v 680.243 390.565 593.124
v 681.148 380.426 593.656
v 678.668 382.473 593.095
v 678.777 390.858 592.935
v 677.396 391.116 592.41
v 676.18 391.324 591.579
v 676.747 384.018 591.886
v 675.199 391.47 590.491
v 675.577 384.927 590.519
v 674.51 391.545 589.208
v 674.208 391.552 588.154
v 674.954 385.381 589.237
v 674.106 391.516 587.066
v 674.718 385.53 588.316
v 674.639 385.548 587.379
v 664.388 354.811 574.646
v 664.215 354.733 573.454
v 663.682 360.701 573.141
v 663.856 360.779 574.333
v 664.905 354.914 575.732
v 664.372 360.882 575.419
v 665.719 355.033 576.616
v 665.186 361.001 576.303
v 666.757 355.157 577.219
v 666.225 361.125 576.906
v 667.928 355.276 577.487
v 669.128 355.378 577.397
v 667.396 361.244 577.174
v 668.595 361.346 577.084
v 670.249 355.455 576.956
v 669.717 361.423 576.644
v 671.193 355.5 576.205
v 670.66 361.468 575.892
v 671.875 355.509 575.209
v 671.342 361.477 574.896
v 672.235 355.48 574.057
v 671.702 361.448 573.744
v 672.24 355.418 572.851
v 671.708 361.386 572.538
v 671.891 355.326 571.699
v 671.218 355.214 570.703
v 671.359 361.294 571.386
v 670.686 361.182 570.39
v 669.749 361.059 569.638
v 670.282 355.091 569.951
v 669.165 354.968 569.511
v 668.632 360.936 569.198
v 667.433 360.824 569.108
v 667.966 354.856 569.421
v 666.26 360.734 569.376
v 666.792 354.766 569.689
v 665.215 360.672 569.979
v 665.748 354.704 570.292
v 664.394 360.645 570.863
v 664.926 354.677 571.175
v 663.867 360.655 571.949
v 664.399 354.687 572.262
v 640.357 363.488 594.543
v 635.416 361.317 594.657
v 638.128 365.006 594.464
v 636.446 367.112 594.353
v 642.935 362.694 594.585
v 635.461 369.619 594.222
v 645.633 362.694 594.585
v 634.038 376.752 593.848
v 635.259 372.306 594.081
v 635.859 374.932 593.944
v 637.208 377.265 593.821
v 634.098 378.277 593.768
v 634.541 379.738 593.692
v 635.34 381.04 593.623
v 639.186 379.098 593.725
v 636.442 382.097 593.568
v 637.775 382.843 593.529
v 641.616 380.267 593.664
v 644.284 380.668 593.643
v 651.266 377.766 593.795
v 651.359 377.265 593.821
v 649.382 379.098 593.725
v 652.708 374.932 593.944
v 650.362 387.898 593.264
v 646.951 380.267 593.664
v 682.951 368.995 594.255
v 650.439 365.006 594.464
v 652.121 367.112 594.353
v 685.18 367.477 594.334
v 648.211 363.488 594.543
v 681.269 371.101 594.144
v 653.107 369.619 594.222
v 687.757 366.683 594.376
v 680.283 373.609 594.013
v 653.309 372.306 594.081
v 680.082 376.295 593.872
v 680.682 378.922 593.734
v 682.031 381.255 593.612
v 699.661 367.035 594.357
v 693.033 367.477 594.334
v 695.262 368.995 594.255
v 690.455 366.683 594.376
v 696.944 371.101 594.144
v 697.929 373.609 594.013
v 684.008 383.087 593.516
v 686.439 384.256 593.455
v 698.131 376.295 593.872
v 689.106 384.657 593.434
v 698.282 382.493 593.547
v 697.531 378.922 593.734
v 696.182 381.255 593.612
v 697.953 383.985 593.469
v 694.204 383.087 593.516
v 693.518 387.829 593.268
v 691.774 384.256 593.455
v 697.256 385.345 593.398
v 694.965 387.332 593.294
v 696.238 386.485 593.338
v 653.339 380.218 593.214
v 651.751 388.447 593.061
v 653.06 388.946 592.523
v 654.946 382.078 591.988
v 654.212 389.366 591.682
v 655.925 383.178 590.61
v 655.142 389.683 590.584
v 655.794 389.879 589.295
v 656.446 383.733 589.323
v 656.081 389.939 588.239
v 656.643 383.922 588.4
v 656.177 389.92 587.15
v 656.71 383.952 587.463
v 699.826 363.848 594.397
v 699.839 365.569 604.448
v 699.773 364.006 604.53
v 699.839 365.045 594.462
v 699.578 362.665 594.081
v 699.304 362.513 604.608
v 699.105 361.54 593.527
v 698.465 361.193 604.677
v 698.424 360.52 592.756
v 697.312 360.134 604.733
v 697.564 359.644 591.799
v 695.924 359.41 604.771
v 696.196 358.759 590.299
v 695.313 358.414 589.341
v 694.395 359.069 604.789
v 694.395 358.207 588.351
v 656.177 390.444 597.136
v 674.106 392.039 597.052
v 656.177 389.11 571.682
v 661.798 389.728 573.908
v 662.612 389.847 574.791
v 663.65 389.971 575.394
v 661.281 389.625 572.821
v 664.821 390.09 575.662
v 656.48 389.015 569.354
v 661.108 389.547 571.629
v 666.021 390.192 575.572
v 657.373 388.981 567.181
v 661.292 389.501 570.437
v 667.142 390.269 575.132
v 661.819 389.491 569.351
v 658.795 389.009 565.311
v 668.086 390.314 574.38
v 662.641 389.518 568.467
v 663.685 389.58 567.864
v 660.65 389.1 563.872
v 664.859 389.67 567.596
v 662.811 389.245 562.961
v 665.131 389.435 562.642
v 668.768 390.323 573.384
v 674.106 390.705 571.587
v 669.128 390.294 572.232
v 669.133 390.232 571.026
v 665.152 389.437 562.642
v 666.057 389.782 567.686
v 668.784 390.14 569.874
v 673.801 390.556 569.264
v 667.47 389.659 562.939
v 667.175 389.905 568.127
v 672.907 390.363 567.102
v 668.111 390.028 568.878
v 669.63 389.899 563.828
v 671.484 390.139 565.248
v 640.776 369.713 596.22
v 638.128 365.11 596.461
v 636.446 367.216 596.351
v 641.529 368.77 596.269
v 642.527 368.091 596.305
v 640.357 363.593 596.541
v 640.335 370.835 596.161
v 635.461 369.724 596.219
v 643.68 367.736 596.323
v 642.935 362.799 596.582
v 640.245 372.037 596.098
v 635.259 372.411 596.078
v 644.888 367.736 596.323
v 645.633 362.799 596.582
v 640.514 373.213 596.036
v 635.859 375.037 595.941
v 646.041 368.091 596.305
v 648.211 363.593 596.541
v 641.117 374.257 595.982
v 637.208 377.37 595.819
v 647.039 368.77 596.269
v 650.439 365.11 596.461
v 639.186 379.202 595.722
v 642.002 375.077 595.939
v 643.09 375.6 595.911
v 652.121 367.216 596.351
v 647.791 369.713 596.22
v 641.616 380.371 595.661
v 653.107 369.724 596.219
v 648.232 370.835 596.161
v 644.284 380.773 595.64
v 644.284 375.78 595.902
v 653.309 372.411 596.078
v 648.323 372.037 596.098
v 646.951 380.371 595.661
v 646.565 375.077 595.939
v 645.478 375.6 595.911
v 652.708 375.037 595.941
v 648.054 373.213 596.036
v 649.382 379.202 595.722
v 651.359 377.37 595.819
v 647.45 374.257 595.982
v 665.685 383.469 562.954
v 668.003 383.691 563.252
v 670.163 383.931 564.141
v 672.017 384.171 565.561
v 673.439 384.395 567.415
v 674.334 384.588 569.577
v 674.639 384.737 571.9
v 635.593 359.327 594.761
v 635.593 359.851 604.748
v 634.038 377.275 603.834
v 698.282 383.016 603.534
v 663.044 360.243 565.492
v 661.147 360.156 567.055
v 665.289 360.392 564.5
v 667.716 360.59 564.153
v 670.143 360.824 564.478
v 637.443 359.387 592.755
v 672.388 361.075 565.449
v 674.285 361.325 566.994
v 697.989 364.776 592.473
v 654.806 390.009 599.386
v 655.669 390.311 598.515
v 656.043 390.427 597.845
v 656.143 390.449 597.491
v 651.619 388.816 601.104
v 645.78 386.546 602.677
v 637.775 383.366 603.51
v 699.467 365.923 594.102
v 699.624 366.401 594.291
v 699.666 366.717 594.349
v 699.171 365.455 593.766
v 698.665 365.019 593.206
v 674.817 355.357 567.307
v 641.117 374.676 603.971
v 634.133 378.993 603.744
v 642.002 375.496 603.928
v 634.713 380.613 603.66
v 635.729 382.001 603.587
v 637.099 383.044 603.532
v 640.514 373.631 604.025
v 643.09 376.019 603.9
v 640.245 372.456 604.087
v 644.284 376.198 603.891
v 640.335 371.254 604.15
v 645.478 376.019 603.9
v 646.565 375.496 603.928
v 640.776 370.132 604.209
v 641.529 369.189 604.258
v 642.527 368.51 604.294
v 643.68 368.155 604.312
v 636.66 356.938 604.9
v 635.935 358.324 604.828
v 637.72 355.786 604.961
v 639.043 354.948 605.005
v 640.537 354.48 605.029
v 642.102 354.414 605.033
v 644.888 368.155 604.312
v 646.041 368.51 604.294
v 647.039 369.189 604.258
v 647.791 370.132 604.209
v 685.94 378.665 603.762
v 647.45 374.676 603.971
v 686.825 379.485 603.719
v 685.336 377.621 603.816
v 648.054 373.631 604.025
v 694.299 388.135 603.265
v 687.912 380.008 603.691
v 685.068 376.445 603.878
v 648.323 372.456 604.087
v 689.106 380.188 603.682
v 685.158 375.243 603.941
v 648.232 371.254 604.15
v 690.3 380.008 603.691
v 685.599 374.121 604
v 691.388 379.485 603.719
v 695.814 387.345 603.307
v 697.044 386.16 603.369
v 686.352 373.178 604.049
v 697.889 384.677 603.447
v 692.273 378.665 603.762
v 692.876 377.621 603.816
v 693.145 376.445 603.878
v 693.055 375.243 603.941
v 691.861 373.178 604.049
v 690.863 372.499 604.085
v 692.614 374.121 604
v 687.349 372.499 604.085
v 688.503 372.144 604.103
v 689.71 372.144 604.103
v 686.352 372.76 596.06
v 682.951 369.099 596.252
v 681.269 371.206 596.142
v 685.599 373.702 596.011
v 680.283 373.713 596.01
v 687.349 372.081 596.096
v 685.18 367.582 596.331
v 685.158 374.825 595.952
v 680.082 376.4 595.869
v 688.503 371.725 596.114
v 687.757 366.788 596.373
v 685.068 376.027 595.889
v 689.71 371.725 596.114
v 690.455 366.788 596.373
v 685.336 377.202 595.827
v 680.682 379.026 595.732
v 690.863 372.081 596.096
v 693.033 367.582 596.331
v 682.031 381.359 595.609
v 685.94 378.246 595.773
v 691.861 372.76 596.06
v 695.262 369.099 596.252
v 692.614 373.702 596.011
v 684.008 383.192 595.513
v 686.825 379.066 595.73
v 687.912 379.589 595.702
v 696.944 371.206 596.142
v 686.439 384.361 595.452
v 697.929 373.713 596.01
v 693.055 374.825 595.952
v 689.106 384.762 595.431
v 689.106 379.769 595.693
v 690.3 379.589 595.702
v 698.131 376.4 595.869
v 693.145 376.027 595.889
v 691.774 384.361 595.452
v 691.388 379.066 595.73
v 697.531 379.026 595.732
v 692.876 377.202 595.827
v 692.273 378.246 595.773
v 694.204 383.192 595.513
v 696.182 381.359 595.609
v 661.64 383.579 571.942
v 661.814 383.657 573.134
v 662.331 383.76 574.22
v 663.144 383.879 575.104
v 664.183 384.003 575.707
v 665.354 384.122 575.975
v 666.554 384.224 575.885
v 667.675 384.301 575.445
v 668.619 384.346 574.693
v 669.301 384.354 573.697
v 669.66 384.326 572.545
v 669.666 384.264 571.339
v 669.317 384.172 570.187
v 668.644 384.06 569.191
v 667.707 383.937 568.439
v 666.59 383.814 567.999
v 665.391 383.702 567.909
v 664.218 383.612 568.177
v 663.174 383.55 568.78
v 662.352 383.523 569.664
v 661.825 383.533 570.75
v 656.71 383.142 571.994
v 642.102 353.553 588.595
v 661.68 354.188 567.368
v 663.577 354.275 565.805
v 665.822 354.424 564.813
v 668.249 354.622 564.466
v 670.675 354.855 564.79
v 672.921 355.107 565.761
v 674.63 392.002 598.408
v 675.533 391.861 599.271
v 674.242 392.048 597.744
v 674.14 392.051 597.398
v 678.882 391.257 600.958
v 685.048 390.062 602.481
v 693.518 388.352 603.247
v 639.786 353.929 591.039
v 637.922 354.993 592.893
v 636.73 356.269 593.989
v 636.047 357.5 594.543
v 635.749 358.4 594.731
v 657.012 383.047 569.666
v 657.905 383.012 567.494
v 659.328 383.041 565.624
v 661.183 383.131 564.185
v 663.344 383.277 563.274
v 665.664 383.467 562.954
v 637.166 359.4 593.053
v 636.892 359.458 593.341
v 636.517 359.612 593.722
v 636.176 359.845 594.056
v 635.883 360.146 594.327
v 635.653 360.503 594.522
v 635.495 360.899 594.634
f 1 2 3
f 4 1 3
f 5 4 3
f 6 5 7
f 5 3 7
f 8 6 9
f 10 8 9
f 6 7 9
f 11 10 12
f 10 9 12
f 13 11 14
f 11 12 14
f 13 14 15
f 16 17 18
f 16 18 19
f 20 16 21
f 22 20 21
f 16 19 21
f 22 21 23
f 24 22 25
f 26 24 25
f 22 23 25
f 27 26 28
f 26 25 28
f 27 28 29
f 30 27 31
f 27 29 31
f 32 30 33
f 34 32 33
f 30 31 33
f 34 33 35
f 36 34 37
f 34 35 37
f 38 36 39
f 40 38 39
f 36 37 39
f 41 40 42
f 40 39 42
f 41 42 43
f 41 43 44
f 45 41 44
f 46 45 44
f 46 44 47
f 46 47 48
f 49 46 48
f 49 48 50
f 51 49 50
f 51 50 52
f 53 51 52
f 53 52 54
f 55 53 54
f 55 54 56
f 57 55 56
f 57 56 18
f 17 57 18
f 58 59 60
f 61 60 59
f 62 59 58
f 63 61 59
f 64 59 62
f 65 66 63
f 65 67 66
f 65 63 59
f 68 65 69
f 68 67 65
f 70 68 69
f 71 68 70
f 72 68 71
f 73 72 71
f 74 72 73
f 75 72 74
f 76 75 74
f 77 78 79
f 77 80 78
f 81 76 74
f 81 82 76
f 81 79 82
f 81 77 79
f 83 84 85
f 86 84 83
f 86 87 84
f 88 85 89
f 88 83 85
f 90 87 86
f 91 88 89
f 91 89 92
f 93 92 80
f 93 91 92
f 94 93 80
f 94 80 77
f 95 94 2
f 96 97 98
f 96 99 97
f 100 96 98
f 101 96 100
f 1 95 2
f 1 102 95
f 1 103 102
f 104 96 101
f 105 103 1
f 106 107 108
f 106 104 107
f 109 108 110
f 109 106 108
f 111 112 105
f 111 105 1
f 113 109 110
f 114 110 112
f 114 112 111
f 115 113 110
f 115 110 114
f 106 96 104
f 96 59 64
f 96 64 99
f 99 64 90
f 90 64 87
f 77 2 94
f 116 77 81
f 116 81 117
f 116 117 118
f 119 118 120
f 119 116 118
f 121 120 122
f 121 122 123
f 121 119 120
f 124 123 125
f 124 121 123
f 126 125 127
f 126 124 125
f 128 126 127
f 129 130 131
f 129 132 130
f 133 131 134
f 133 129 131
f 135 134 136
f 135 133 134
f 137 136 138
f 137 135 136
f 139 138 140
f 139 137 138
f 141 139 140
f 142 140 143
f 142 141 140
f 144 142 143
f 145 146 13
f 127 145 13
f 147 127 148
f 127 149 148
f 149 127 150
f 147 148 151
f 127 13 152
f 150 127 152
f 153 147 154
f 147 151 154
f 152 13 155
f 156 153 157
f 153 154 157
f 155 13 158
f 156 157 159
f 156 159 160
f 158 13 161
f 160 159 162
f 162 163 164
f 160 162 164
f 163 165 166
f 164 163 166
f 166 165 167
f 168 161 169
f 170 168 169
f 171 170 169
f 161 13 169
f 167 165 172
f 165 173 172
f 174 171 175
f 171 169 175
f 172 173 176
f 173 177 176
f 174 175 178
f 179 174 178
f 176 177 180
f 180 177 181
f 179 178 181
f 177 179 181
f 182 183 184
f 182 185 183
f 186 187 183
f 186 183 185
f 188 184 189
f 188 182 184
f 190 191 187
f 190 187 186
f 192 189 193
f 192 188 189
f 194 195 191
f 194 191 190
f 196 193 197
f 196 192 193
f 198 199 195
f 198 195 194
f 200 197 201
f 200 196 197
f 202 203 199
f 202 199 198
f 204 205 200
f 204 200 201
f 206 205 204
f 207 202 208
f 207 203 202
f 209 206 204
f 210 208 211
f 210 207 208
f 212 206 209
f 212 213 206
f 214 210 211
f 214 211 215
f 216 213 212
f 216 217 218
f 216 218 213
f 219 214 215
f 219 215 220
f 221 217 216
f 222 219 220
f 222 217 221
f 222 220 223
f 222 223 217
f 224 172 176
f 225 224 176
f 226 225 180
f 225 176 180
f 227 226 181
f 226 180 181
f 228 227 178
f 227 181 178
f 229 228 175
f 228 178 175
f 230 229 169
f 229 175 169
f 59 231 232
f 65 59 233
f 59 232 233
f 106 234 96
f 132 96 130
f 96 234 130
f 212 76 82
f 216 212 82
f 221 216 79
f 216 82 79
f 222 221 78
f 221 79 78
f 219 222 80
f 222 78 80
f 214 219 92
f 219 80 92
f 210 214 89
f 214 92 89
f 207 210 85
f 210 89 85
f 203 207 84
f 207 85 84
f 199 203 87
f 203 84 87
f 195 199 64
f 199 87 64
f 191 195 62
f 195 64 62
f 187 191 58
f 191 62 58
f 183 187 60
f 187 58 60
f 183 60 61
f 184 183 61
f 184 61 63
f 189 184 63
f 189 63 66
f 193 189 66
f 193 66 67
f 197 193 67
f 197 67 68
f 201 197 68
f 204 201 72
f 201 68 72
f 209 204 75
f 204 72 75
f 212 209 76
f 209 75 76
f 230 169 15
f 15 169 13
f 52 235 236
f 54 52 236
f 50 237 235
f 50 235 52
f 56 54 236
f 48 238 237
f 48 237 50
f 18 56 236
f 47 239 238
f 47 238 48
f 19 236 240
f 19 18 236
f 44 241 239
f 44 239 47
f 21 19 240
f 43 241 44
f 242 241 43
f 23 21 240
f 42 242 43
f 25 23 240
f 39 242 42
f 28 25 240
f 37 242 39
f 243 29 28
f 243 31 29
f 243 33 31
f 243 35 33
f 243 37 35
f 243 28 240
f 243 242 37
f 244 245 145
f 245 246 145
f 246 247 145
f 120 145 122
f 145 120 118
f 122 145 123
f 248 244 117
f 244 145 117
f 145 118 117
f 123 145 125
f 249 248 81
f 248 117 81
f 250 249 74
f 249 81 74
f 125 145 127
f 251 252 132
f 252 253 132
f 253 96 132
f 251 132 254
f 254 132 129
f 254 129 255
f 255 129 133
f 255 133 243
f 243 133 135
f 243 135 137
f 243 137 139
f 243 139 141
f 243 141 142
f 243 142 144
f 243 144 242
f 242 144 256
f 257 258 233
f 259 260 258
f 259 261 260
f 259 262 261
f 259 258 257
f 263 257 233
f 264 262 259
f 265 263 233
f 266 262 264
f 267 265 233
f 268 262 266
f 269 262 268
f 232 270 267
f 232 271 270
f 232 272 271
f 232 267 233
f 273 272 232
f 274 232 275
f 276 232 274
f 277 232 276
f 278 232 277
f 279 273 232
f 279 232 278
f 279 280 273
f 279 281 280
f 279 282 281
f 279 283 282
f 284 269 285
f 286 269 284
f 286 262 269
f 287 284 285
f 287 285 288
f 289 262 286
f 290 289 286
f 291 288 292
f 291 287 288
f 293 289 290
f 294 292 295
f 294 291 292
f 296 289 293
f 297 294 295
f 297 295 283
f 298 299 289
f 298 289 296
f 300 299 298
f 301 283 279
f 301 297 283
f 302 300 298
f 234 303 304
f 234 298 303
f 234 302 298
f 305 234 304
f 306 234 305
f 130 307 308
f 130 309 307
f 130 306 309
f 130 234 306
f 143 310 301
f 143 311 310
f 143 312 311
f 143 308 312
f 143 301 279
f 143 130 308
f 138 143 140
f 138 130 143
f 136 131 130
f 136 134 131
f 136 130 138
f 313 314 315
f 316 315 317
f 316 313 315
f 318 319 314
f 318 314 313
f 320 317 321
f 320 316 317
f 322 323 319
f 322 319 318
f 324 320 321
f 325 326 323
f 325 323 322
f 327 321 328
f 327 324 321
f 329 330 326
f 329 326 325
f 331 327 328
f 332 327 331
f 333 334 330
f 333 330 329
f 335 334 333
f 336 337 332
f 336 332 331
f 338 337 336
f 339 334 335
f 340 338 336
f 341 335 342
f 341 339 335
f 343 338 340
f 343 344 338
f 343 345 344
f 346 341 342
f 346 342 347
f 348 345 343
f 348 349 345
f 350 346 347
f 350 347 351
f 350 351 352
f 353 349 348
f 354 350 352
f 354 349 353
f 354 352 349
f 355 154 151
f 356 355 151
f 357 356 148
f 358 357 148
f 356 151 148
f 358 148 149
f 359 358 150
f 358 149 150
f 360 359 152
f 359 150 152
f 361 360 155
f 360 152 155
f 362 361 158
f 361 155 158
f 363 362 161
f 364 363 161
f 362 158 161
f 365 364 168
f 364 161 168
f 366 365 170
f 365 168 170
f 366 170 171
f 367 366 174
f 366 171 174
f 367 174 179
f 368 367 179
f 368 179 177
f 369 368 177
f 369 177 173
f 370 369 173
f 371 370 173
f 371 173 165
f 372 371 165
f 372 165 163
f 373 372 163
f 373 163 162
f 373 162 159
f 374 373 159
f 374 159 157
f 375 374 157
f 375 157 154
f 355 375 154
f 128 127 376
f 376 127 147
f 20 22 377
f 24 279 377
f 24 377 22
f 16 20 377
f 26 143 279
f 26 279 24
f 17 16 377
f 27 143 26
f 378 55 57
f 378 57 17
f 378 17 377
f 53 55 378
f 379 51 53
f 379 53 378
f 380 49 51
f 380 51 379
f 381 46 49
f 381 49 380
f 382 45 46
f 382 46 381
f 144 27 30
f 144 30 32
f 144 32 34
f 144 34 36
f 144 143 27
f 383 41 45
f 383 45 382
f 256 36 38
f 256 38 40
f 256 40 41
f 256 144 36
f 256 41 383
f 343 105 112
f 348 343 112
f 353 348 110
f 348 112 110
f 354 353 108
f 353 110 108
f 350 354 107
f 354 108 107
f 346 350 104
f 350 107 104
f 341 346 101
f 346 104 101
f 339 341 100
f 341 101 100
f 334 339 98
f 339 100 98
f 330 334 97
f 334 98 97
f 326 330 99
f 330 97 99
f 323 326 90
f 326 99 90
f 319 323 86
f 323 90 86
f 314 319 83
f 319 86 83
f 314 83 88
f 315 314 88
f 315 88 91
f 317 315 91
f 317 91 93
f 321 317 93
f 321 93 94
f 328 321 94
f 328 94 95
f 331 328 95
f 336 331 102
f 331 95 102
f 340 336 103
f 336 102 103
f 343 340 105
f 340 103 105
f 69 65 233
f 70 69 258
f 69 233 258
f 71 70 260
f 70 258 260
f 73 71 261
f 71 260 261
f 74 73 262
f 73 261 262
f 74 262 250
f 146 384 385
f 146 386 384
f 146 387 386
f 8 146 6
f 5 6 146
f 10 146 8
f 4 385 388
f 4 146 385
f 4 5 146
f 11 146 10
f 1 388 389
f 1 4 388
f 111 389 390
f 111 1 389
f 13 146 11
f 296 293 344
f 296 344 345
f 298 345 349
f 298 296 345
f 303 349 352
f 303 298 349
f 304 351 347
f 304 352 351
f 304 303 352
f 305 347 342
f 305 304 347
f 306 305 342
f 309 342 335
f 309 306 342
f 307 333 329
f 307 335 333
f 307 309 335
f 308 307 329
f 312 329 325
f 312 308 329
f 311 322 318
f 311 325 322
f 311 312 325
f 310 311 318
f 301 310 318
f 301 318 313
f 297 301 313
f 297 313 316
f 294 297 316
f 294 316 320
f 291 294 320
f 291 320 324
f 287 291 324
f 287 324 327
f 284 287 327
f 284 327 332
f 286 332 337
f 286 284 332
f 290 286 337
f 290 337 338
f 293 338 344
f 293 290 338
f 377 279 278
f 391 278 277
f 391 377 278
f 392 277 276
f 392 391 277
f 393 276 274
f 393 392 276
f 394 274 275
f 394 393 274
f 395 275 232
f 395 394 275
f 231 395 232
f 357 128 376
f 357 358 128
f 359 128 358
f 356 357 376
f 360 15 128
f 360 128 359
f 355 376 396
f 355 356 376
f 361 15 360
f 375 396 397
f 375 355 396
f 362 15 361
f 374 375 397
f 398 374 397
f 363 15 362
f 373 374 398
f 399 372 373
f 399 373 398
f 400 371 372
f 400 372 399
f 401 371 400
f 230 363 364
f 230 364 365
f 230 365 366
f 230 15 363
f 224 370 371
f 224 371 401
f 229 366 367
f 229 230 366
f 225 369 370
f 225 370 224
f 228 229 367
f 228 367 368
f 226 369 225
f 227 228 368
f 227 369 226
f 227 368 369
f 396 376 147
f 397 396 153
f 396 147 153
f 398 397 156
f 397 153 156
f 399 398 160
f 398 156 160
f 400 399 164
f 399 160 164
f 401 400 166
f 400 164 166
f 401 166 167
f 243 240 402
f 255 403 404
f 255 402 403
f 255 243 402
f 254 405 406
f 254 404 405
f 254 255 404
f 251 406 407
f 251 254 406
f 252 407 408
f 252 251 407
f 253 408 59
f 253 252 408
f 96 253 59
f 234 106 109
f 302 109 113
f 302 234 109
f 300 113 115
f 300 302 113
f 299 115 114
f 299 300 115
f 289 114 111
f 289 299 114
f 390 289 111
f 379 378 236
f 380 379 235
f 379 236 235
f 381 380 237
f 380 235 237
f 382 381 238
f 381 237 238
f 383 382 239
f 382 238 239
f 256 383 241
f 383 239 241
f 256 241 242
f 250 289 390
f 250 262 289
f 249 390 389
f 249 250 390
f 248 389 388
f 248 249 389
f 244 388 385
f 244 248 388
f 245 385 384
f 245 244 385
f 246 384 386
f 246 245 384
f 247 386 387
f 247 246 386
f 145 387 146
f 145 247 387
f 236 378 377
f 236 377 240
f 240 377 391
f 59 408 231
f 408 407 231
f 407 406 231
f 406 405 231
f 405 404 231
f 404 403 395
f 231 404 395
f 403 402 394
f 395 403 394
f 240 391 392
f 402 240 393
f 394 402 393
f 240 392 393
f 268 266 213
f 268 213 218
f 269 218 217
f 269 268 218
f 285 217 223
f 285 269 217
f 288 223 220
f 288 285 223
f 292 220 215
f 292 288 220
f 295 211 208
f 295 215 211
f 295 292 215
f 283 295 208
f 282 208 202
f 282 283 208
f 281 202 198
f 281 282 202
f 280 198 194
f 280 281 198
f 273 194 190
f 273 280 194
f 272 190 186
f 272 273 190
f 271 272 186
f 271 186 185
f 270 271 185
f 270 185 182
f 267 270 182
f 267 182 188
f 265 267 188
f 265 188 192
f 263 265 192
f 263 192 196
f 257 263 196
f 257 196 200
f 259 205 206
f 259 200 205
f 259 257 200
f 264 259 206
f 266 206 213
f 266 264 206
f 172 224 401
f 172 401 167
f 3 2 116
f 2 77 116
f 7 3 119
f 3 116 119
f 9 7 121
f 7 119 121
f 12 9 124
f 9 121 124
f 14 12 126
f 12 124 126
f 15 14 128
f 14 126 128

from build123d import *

# Parameters (mm, degrees)
SKETCH_2_R          = 4.050000000000024
EXTRUDE_1_DEPTH     = 50
CUT_EXTRUDE_1_DEPTH = 100
CUT_EXTRUDE_2_DEPTH = 100
SKETCH_7_R          = 4.050000000000008
CUT_EXTRUDE_3_DEPTH = 100
CUT_EXTRUDE_6_DEPTH = 20
CUT_EXTRUDE_7_DEPTH = 20
CUT_EXTRUDE_8_DEPTH = 20
FILLET_1_R          = 6
FILLET_2_R          = 2
FILLET_3_R          = 6
FILLET_4_R          = 6
SKETCH_13_R         = 9.049999999999946
CUT_EXTRUDE_9_DEPTH = 2


with BuildPart() as part:
    # ｽｹｯﾁ2 → ﾎﾞｽ - 押し出し1 (new body)
    with BuildSketch(Plane(origin=(-3.9916e-13, 32.90329120575703, 627.8321969731651), x_dir=(-1, -3e-17, -6.3e-16), z_dir=(0, -0.05233595624294474, -0.9986295347545739))):
        Polygon((-697.0422820628135, 364.8089319187604), (-700.5932035956617, 324.9668567184454), (-636.3478573351539, 319.2409957467275), (-632.7969358023056, 359.08307094704253), align=None)
        with Locations(Location((-644.2839023988065, 340.0275704705168, 0), (0, 0, 90))):
            Circle(SKETCH_2_R, mode=Mode.SUBTRACT)
        with Locations(Location((-689.106236999161, 344.02235719497116, 0), (0, 0, 90))):
            Circle(SKETCH_2_R, mode=Mode.SUBTRACT)
    extrude(amount=EXTRUDE_1_DEPTH)

    # ｽｹｯﾁ5 → ｶｯﾄ - 押し出し1 (cut)
    with BuildSketch(Plane(origin=(723.8064708248907, 64.42078199043551, -3.3761501237952602), x_dir=(-0.004627728743617884, -0.0004118806842991107, -0.9999892071822463), z_dir=(0.9960518800078746, 0.08865137795745748, -0.004646021849131346))):
        Polygon((-608.1434669406992, 296.09511014614947), (-567.6985342683519, 293.98384959158335), (-567.3857549269345, 299.9756914689684), (-597.8442844703076, 301.56565312117255), (-596.645296994875, 324.5343803178144), (-566.186767451502, 322.9444186656103), (-565.8739881100848, 328.9362605429951), (-606.3189207824322, 331.0475210975612), (-626.0453368448235, 332.0772571204365), (-625.4050029902406, 344.3439854408341), (-551.5560275003857, 340.4890048871531), (-554.6576307812425, 281.07230447123857), (-628.5066062710979, 284.92728502491957), (-628.5066062710974, 296.97977053027586), align=None)
    extrude(amount=-CUT_EXTRUDE_1_DEPTH, mode=Mode.SUBTRACT)

    # ｽｹｯﾁ6 → ｶｯﾄ - 押し出し2 (cut)
    with BuildSketch(Plane(origin=(723.8064708248907, 64.42078199043551, -3.3761501237952602), x_dir=(-0.004627728743617884, -0.0004118806842991107, -0.9999892071822463), z_dir=(0.9960518800078746, 0.08865137795745748, -0.004646021849131346))):
        Polygon((-606.3189207824322, 331.04752109756123), (-608.1434669406992, 296.0951101461494), (-619.732969083748, 290.9532658931082), (-617.724208131906, 336.87839675393917), align=None)
    extrude(amount=-CUT_EXTRUDE_2_DEPTH, mode=Mode.SUBTRACT)

    # ｽｹｯﾁ7 → ｶｯﾄ - 押し出し3 (cut)
    with BuildSketch(Plane(origin=(-26.542256166274278, 297.4014749020998, -15.586150855120477), x_dir=(0.9960518800078747, 0.0886513779574575, -0.004646021849131969), z_dir=(-0.0887730383212076, 0.9946868255236824, -0.05212932760779488))):
        with Locations(Location((694.4254727867873, -591.2519877036084, 0), (0, 0, 179.733439165))):
            Circle(SKETCH_7_R)
    extrude(amount=-CUT_EXTRUDE_3_DEPTH, mode=Mode.SUBTRACT)

    # ｽｹｯﾁ8 → ｶｯﾄ - 押し出し6 (cut)
    with BuildSketch(Plane(origin=(-26.542256166274278, 297.4014749020998, -15.586150855120477), x_dir=(0.9960518800078747, 0.0886513779574575, -0.004646021849131969), z_dir=(-0.0887730383212076, 0.9946868255236824, -0.05212932760779488))):
        with BuildLine():
            Line((653.0837968072778, -612.7519877036083), (685.4254727867873, -612.7519877036083))
            Line((685.4254727867873, -612.7519877036083), (685.4254727867873, -591.2626120432828))
            ThreePointArc((685.4254727867873, -591.2626120432828), (694.420160616025, -582.2519830004186), (703.4254727867874, -591.2519877036085))
            Line((703.4254727867874, -591.2519877036085), (703.4254727867874, -612.7519877036083))
            Line((703.4254727867874, -612.7519877036083), (732.6544524188718, -612.7519877036083))
            Line((732.6544524188718, -612.7519877036083), (732.6544524188718, -571.4472878962366))
            Line((732.6544524188718, -571.4472878962366), (653.0837968072778, -571.4472878962366))
            Line((653.0837968072778, -571.4472878962366), (653.0837968072778, -612.7519877036083))
        make_face()
    extrude(amount=-CUT_EXTRUDE_6_DEPTH, mode=Mode.SUBTRACT)

    # ｽｹｯﾁ9 → ｶｯﾄ - 押し出し7 (cut)
    with BuildSketch(Plane(origin=(-23.96783805495928, 268.5555569619133, -14.074400354494276), x_dir=(0.9960518800078746, 0.08865137795745749, -0.0046460218491326), z_dir=(-0.08877303832120763, 0.994686825523682, -0.052129327607802006))):
        with BuildLine():
            Line((701.0201444957777, -585.1274220005872), (726.6754727867866, -612.7519877036101))
            Line((726.6754727867866, -612.7519877036101), (726.6754727867866, -582.25198770361))
            Line((726.6754727867866, -582.25198770361), (694.4254732410474, -582.25198770361))
            ThreePointArc((694.4254732410474, -582.2519877036095), (698.0226182987518, -583.0021062398702), (701.0201444957777, -585.1274220005872))
        make_face()
        with BuildLine():
            ThreePointArc((687.8308010777955, -585.1274220005871), (690.8283276912211, -583.0021060583099), (694.4254732410474, -582.2519877036095))
            Line((694.4254732410474, -582.25198770361), (662.1754727867867, -582.25198770361))
            Line((662.1754727867867, -582.25198770361), (662.1754727867866, -612.7519877036101))
            Line((662.1754727867866, -612.7519877036101), (687.8308010777955, -585.1274220005871))
        make_face()
    extrude(amount=-CUT_EXTRUDE_7_DEPTH, mode=Mode.SUBTRACT)

    # ｽｹｯﾁ10 → ｶｯﾄ - 押し出し8 (cut)
    with BuildSketch(Plane(origin=(-4.2186e-13, 32.06896121623387, 611.9122324003949), x_dir=(-1, -4e-17, -7.1e-16), z_dir=(0, -0.05233595624294566, -0.9986295347545738))):
        Polygon((-674.1060084484338, 360.25482907777223), (-697.885625926865, 355.3464390586851), (-697.2642146586165, 362.31880221874025), align=None)
        Polygon((-656.177074608292, 358.65691438799047), (-633.6427427973452, 349.59294124702217), (-633.0188683981086, 356.5929412470222), align=None)
    extrude(amount=-CUT_EXTRUDE_8_DEPTH, mode=Mode.SUBTRACT)

    # ﾌｨﾚｯﾄ1
    fillet_1_edges = [part.edges().sort_by_distance(p)[0] for p in [
        (700.3712709998582, 359.33885899665444, 599.767605561525),
        (636.1259247393505, 353.62084511839845, 600.0672739707941),
        (697.8856259268646, 387.19009011131783, 598.3079843885063),
        (633.6427427973448, 381.4444772684454, 598.6090991982213),
    ]]
    fillet(fillet_1_edges, radius=FILLET_1_R)

    # ﾌｨﾚｯﾄ2
    # the kernel refuses this fillet: 2 mm, written as the material it adds along each edge
    with BuildSketch(Plane(origin=(699.838632769931, 365.045300168582, 594.461681922105), x_dir=(-0.08877303832120755, 0.9946868255236814, -0.052129327607815884), z_dir=(-0.9960518800078746, -0.08865137795745748, 0.004646021849131346))) as fillet_2_piece_1_section:
        with BuildLine():
            CenterArc((FILLET_2_R, FILLET_2_R), FILLET_2_R, 180.00000000000324, 89.99999999999625)
            Line((2.78e-15, FILLET_2_R), (0, 0))
            Line((0, 0), (FILLET_2_R, 0))
        make_face()
    fillet_2_piece_1 = extrude(amount=64.49999999999983, mode=Mode.PRIVATE)
    fillet_2_piece_1 = split(fillet_2_piece_1, bisect_by=Plane(origin=(684.700257312396, 363.3009068359351, 578.2094916382387), z_dir=(-0.7298483504195092, -0.029343525726524503, 0.6829790208255727)), keep=Keep.TOP, mode=Mode.PRIVATE)
    fillet_2_piece_1 = split(fillet_2_piece_1, bisect_by=Plane(origin=(650.6507062336964, 360.2704024189458, 578.3683136457086), z_dir=(0.7298483504195105, 0.10057352631328549, 0.6761703566371646)), keep=Keep.TOP, mode=Mode.PRIVATE)
    add(fillet_2_piece_1)

    # ﾌｨﾚｯﾄ3
    fillet_3_edges = [part.edges().sort_by_distance(p)[0] for p in [
        (665.1415415283625, 391.55557073207024, 603.0860609736587),
    ]]
    fillet(fillet_3_edges, radius=FILLET_3_R)

    # ﾌｨﾚｯﾄ4
    fillet_4_edges = [part.edges().sort_by_distance(p)[0] for p in [
        (665.6741797582897, 385.06409021649864, 593.4125415917601),
        (656.4433937232551, 387.2502882914526, 593.2979678055787),
        (674.372327563397, 388.84601309468684, 593.2143394122943),
    ]]
    fillet(fillet_4_edges, radius=FILLET_4_R)

    # ｽｹｯﾁ13 → ｶｯﾄ - 押し出し9 (cut)
    with BuildSketch(Plane(origin=(-4.2186e-13, 32.06896121623387, 611.9122324003949), x_dir=(-1, -4e-17, -7e-16), z_dir=(0, -0.05233595624294553, -0.9986295347545739))):
        with Locations(Location((-689.106236999161, 344.02235719497077, 0), (0, 0, 90))):
            Circle(SKETCH_13_R)
        with Locations(Location((-644.2839023988065, 340.02757047051637, 0), (0, 0, 90))):
            Circle(SKETCH_13_R)
    extrude(amount=-CUT_EXTRUDE_9_DEPTH, mode=Mode.SUBTRACT)


solid = part.part
